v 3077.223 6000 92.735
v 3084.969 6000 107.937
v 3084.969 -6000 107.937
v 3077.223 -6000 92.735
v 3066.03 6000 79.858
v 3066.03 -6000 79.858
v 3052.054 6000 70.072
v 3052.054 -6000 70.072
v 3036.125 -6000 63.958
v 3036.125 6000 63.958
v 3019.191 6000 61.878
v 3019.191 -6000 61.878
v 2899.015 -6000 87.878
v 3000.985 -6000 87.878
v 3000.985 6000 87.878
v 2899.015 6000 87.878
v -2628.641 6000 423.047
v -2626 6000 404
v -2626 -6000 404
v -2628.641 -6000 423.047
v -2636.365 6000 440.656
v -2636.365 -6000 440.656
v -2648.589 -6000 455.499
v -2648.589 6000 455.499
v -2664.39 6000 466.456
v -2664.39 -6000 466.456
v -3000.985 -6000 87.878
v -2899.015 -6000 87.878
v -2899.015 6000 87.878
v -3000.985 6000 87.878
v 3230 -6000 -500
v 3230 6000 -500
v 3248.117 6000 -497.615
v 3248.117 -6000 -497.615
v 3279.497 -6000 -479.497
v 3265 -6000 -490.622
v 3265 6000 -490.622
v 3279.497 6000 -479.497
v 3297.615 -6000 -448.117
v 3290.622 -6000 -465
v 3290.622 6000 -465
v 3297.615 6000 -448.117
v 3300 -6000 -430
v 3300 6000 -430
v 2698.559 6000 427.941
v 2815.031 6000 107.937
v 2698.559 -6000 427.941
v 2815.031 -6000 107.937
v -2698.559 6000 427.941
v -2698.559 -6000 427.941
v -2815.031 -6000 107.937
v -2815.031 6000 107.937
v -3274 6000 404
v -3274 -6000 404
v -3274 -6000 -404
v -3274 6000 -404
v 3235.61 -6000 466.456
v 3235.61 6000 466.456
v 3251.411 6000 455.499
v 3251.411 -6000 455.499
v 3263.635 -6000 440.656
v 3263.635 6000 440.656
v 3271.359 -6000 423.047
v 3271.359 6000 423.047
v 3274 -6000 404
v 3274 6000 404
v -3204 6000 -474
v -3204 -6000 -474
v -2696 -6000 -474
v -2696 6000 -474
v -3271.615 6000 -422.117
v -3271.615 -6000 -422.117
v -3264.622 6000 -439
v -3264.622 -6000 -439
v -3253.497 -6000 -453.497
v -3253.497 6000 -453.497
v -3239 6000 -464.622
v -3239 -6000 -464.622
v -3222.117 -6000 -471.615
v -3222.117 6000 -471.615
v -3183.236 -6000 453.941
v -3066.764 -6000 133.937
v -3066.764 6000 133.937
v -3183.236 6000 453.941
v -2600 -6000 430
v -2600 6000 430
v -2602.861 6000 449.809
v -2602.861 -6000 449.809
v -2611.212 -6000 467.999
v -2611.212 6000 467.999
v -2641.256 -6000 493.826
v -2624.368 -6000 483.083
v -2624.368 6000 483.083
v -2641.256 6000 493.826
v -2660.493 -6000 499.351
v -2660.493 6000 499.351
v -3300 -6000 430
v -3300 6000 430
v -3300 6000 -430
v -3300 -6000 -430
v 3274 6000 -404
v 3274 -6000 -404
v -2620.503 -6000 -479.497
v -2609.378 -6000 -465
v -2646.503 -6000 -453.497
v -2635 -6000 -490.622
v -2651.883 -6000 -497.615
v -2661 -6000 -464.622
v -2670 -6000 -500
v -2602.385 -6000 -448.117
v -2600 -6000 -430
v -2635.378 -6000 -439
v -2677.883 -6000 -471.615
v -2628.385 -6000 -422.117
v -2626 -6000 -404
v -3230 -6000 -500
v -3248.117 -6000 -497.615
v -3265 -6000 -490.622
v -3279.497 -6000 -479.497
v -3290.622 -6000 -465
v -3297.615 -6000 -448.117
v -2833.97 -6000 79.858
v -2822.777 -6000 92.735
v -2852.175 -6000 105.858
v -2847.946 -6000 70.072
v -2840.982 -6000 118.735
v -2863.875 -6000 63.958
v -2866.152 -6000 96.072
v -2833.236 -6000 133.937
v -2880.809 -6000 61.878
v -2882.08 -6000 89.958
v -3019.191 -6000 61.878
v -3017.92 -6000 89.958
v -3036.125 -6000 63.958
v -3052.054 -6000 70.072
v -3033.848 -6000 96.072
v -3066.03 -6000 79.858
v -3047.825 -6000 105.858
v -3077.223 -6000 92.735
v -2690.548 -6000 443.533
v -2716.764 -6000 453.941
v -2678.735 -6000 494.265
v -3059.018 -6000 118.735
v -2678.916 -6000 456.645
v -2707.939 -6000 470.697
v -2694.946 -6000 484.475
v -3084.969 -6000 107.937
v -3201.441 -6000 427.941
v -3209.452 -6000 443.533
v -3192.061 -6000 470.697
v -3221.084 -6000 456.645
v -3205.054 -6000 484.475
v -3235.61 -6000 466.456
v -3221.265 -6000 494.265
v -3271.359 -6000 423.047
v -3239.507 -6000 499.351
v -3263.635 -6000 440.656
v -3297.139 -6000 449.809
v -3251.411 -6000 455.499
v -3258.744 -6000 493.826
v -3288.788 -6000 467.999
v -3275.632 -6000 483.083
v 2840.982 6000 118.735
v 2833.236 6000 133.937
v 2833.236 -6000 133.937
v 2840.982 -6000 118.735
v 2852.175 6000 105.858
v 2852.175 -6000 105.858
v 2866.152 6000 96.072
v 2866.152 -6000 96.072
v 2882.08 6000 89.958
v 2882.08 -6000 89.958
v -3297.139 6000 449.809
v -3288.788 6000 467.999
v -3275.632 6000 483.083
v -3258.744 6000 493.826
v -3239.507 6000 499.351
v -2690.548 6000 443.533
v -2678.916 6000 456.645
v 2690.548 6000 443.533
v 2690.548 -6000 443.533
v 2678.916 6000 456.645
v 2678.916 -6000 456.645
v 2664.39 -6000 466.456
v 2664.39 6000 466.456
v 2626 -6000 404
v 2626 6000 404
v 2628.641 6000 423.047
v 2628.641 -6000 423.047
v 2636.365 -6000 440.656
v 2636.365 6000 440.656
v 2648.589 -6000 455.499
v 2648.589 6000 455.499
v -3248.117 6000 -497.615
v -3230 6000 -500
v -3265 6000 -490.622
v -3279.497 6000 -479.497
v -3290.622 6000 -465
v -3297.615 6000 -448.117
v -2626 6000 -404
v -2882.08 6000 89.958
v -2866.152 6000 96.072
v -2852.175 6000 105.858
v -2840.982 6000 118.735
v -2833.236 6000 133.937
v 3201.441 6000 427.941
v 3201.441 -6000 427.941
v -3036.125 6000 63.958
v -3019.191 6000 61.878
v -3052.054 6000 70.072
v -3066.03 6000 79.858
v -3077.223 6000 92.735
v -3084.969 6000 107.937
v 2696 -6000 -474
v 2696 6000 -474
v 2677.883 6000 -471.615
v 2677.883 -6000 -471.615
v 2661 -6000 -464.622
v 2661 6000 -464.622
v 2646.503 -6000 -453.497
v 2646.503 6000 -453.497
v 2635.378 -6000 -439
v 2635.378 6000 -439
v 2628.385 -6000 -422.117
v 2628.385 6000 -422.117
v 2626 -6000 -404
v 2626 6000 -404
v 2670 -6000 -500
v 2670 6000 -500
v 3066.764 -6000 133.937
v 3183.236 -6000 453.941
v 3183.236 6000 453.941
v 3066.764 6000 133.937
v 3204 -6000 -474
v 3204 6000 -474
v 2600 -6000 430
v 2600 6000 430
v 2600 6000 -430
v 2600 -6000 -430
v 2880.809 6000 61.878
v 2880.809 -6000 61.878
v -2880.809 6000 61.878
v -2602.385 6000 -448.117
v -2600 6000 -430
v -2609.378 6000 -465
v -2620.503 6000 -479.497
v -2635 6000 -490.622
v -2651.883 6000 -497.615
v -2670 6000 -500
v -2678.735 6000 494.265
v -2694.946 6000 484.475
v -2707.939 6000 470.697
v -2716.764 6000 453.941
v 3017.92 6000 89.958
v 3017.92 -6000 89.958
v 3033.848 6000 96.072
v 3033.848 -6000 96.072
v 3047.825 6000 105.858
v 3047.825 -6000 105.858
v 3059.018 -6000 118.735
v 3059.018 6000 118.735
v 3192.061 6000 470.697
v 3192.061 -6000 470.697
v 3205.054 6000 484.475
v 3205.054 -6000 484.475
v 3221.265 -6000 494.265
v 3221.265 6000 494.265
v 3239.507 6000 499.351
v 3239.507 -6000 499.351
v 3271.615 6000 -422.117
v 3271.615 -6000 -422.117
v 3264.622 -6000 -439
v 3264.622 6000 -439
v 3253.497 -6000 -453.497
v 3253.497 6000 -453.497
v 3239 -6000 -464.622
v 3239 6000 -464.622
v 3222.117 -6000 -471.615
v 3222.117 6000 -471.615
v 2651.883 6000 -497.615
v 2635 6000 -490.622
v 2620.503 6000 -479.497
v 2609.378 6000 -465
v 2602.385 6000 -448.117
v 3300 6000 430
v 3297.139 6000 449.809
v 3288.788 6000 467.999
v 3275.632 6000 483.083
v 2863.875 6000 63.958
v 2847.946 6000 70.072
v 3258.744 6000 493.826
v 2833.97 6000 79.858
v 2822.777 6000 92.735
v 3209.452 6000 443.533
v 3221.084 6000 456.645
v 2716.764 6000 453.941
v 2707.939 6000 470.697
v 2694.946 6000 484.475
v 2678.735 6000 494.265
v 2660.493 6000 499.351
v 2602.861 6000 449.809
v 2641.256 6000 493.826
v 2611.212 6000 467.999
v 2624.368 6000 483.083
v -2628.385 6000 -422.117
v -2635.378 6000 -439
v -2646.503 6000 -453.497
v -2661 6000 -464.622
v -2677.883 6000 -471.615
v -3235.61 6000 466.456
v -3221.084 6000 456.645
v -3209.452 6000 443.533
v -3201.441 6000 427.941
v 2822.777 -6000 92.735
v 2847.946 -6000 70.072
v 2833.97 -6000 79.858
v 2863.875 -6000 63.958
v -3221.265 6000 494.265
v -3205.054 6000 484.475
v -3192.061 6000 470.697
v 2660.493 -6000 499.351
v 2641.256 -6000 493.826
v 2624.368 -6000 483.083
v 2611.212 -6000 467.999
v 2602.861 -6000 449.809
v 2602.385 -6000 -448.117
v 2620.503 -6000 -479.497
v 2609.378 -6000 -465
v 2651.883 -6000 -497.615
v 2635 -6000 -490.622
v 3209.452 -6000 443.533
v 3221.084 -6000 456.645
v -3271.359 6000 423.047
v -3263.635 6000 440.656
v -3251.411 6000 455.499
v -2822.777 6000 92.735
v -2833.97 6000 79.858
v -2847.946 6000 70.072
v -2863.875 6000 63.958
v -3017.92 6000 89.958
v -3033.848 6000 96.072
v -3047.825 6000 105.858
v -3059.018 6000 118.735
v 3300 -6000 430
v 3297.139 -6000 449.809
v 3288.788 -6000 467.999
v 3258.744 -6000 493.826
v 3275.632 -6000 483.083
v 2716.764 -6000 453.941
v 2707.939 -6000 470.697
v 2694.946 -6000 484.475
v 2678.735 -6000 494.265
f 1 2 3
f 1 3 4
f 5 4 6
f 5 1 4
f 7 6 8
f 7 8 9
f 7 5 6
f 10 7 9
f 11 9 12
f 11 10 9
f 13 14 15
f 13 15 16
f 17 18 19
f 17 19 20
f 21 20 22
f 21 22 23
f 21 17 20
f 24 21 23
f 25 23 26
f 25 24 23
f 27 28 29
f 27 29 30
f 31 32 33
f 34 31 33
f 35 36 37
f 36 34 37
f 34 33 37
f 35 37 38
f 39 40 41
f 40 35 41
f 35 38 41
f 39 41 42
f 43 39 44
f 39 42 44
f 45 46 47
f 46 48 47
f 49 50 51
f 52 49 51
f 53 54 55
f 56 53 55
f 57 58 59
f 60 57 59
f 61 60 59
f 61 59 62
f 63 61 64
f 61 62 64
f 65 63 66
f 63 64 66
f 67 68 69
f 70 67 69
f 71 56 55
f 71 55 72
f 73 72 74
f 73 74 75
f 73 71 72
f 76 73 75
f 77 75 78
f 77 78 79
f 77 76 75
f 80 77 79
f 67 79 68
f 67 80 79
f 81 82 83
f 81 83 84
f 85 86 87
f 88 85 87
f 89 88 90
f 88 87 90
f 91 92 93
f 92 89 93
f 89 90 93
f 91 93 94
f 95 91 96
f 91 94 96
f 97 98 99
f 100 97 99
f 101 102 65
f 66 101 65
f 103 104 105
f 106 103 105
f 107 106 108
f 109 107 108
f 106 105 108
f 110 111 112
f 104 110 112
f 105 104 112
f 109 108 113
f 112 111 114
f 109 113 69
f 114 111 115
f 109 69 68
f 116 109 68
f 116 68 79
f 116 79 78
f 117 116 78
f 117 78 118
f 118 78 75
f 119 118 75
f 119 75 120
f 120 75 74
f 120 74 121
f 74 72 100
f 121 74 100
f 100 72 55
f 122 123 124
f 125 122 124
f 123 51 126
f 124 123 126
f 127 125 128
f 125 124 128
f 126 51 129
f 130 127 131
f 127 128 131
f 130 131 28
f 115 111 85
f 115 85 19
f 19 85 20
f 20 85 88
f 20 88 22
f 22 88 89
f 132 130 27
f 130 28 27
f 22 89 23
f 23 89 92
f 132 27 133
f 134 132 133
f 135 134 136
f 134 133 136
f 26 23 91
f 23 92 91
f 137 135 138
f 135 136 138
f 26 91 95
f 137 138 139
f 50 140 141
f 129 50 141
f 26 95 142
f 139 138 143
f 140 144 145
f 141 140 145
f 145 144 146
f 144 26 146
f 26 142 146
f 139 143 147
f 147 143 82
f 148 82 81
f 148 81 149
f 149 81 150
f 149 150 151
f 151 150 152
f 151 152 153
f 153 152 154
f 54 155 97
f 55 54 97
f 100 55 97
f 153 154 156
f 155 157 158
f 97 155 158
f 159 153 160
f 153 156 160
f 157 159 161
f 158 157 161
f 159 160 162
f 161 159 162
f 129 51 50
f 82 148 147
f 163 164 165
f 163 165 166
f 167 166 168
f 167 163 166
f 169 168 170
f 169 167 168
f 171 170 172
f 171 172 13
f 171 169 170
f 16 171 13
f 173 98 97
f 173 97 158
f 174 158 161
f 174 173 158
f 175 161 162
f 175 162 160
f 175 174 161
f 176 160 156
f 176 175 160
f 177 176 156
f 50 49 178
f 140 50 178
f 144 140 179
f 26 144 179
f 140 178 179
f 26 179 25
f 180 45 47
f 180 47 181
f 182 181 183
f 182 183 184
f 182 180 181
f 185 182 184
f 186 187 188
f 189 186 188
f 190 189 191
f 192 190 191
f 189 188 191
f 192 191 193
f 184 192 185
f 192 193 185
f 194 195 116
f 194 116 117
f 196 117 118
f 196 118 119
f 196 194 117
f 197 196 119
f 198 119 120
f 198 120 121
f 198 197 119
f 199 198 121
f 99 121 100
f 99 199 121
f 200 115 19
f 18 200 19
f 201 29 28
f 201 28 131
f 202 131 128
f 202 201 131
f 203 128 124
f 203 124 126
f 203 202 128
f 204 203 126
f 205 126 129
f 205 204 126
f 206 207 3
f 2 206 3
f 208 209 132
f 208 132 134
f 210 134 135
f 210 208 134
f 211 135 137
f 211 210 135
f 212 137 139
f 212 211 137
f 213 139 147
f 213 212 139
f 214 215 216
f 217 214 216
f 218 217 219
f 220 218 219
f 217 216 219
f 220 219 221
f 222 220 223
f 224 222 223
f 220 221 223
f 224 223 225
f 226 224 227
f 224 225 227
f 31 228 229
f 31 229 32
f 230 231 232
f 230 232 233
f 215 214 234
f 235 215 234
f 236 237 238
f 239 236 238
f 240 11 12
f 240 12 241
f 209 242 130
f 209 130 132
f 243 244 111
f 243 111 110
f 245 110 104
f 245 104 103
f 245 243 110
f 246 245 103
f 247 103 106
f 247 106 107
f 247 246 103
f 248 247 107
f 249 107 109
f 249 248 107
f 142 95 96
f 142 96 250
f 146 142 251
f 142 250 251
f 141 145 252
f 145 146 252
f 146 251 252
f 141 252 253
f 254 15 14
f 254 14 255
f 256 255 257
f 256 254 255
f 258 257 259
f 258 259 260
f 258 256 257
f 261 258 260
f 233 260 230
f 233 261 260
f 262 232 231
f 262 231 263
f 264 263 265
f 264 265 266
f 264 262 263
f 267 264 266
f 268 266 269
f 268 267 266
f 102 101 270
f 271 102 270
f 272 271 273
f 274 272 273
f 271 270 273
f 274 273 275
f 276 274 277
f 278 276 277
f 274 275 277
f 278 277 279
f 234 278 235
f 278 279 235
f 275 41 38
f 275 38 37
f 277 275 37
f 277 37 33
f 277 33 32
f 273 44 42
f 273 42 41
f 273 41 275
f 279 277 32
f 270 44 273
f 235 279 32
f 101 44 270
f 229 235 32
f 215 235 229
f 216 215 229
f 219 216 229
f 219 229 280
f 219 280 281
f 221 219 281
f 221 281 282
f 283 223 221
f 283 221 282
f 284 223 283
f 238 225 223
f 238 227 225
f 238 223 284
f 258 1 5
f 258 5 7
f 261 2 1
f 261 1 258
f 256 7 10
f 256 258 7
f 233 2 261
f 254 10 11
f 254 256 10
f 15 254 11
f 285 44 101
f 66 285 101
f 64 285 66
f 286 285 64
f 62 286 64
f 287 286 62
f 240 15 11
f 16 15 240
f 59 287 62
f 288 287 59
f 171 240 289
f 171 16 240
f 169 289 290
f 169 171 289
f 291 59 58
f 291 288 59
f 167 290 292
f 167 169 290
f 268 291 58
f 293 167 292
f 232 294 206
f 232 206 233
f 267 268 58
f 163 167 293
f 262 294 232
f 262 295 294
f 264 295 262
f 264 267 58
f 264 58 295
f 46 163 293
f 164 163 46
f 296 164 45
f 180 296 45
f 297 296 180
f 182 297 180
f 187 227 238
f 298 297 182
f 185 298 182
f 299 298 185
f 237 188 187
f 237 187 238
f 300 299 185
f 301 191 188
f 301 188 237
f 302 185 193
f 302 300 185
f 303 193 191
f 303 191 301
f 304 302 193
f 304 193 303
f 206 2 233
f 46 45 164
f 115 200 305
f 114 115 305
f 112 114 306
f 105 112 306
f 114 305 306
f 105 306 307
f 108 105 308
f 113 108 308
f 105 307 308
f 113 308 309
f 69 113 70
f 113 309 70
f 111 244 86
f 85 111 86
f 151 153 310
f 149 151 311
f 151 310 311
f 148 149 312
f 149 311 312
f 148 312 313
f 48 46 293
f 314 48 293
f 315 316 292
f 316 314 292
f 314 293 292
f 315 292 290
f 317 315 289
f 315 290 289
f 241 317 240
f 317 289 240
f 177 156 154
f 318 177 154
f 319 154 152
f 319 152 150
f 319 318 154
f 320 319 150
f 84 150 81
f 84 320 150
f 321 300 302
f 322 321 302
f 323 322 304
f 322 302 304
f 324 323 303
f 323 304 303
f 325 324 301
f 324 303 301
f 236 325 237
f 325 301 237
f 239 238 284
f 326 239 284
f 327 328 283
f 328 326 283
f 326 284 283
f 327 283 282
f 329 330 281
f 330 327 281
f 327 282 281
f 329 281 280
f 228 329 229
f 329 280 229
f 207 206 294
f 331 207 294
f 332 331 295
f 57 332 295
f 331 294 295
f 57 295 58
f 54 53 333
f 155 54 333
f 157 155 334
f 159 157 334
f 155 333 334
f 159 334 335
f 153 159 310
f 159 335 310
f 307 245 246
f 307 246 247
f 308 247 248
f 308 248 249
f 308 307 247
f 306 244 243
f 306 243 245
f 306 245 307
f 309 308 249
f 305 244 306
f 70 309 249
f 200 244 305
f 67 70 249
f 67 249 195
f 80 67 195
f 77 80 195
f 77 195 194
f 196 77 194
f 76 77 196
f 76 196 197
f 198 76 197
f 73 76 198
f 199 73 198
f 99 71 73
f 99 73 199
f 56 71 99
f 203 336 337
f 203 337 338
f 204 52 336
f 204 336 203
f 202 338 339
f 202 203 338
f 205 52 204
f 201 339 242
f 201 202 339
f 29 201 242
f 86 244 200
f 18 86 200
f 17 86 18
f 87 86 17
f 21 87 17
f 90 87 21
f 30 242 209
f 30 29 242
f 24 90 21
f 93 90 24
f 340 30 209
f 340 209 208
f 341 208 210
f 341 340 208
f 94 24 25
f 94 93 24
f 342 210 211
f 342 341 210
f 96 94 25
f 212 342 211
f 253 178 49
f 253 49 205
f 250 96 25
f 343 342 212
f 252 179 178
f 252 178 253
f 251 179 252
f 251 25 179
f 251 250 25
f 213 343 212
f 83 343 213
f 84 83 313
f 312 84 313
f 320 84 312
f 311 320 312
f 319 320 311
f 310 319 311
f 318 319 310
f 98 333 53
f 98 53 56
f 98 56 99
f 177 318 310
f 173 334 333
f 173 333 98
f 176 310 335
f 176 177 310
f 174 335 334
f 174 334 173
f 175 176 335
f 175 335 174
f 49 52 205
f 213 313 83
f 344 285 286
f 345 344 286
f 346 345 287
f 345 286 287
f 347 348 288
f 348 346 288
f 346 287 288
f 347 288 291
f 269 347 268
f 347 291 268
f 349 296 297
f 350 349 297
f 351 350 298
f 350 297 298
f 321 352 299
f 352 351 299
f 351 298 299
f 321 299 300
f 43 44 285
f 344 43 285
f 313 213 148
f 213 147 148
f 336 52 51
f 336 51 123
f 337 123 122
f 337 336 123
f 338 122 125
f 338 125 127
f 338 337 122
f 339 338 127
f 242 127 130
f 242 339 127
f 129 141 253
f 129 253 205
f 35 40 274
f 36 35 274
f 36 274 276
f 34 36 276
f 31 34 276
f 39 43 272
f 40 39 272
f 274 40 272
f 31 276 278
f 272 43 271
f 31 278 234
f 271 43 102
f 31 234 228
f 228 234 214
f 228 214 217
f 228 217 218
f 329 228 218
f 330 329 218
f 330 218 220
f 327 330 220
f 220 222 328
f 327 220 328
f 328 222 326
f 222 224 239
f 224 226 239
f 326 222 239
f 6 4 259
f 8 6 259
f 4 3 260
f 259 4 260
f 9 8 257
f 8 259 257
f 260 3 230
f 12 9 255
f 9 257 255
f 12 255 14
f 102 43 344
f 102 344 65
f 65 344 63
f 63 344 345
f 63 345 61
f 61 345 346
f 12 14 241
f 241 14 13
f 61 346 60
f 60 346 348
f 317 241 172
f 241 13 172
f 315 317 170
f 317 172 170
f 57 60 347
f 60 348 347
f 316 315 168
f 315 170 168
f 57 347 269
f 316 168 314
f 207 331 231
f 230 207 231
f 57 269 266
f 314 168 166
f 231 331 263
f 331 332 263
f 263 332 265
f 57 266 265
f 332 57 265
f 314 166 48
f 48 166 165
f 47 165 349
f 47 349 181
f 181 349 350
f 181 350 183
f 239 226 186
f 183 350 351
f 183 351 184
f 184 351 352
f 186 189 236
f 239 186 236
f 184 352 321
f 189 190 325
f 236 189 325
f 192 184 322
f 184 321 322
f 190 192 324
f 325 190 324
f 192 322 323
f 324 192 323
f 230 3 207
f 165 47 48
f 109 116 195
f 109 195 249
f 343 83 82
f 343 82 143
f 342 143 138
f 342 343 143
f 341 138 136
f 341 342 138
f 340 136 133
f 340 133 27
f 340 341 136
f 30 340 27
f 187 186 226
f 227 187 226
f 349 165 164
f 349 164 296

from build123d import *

# Parameters (mm, degrees)
F1_DEPTH    = 6000
F2_T        = -26
F2_2_T      = -26
F3_T1_DEPTH = 12000
F3_T3_DEPTH = 12350
F3_T5_DEPTH = 12245.0726383734
F4_T1_DEPTH = 12000
F4_T3_DEPTH = 12350
F4_T5_DEPTH = 12245.0726383734


# Not quite as in the source:
# - a fillet or chamfer that OpenCascade refuses, or shapes differently, is made with other operations: its cross-section is extruded or revolved along the edge and cut away or added
# - a feature names something its author has since deleted; it is built from what else it names


with BuildPart() as f1:
    # F0 (on Front) → F1 (new body, symmetric)
    with BuildSketch(Plane.XZ):
        Polygon((2700, 500), (2600, 500), (2600, 200), (2600, 0), (2600, -200), (2600, -500), (3300, -500), (3300, 500), (3200, 500), (3050, 87.8783870818), (2850, 87.8783870818), align=None)
    extrude(amount=F1_DEPTH, both=True)

    # F2
    f2_openings = [f1.faces().sort_by_distance(p)[0] for p in [
        (2950, -6000, -83.929869),
        (2950, 6000, -83.929869),
    ]]
    offset(amount=F2_T, openings=f2_openings, kind=Kind.INTERSECTION)

    # F3: fillet of radius 70 on 16 edges, made by hand

    # F3_s2 → F3_t1 (join)
    with BuildSketch(Plane.XZ.offset(-6000)):
        with BuildLine():
            ThreePointArc((2833.2360442197, 133.936977049), (2858.8641771301, 100.5377439816), (2899.0145276747, 87.8783870818))
            Line((2899.0145276747, 87.8783870818), (2850, 87.8783870818))
            Line((2850, 87.8783870818), (2833.2360442197, 133.936977049))
        make_face()
        with BuildLine():
            ThreePointArc((2696, -474), (2646.5025253169, -453.4974746831), (2626, -404))
            Line((2626, -404), (2626, -474))
            Line((2626, -474), (2696, -474))
        make_face()
        with BuildLine():
            ThreePointArc((3201.4414402131, 427.9414100328), (3227.0695731236, 461.3406431002), (3267.2199236681, 474))
            Line((3267.2199236681, 474), (3218.2053959935, 474))
            Line((3218.2053959935, 474), (3201.4414402131, 427.9414100328))
        make_face()
        with BuildLine():
            ThreePointArc((3204, 474), (3253.4974746831, 453.4974746831), (3274, 404))
            Line((3274, 404), (3274, 474))
            Line((3274, 474), (3204, 474))
        make_face()
        with BuildLine():
            ThreePointArc((2698.5585597869, 427.9414100328), (2672.9304268764, 461.3406431002), (2632.7800763319, 474))
            Line((2632.7800763319, 474), (2681.7946040065, 474))
            Line((2681.7946040065, 474), (2698.5585597869, 427.9414100328))
        make_face()
        with BuildLine():
            ThreePointArc((2626, 404), (2646.5025253169, 453.4974746831), (2696, 474))
            Line((2696, 474), (2626, 474))
            Line((2626, 474), (2626, 404))
        make_face()
        with BuildLine():
            ThreePointArc((3274, -404), (3253.4974746831, -453.4974746831), (3204, -474))
            Line((3204, -474), (3274, -474))
            Line((3274, -474), (3274, -404))
        make_face()
        with BuildLine():
            ThreePointArc((3000.9854723253, 87.8783870818), (3041.1358228699, 100.5377439816), (3066.7639557803, 133.936977049))
            Line((3066.7639557803, 133.936977049), (3050, 87.8783870818))
            Line((3050, 87.8783870818), (3000.9854723253, 87.8783870818))
        make_face()
    extrude(amount=F3_T1_DEPTH)

    # F3_s4 → F3_t3 (cut)
    with BuildSketch(Plane.XZ.offset(-6175)):
        with BuildLine():
            ThreePointArc((3300, 430), (3279.4974746831, 479.4974746831), (3230, 500))
            Line((3230, 500), (3300, 500))
            Line((3300, 500), (3300, 430))
        make_face()
        with BuildLine():
            ThreePointArc((2670, 500), (2620.5025253169, 479.4974746831), (2600, 430))
            Line((2600, 430), (2600, 500))
            Line((2600, 500), (2670, 500))
        make_face()
        with BuildLine():
            ThreePointArc((3230, -500), (3279.4974746831, -479.4974746831), (3300, -430))
            Line((3300, -430), (3300, -500))
            Line((3300, -500), (3230, -500))
        make_face()
        with BuildLine():
            ThreePointArc((2600, -430), (2620.5025253169, -479.4974746831), (2670, -500))
            Line((2670, -500), (2600, -500))
            Line((2600, -500), (2600, -430))
        make_face()
    extrude(amount=F3_T3_DEPTH, mode=Mode.SUBTRACT)

    # F3_s6 → F3_t5 (cut)
    with BuildSketch(Plane.XZ.offset(-6122.5363191867)):
        with BuildLine():
            ThreePointArc((2716.7639557803, 453.9414100328), (2691.1358228699, 487.3406431002), (2650.9854723253, 500))
            Line((2650.9854723253, 500), (2700, 500))
            Line((2700, 500), (2716.7639557803, 453.9414100328))
        make_face()
        with BuildLine():
            ThreePointArc((3183.2360442197, 453.9414100328), (3208.8641771301, 487.3406431002), (3249.0145276747, 500))
            Line((3249.0145276747, 500), (3200, 500))
            Line((3200, 500), (3183.2360442197, 453.9414100328))
        make_face()
        with BuildLine():
            ThreePointArc((3084.9693517738, 107.936977049), (3059.3412188633, 74.5377439816), (3019.1908683188, 61.8783870818))
            Line((3019.1908683188, 61.8783870818), (3068.2053959935, 61.8783870818))
            Line((3068.2053959935, 61.8783870818), (3084.9693517738, 107.936977049))
        make_face()
        with BuildLine():
            ThreePointArc((2815.0306482262, 107.936977049), (2840.6587811367, 74.5377439816), (2880.8091316812, 61.8783870818))
            Line((2880.8091316812, 61.8783870818), (2831.7946040065, 61.8783870818))
            Line((2831.7946040065, 61.8783870818), (2815.0306482262, 107.936977049))
        make_face()
    extrude(amount=F3_T5_DEPTH, mode=Mode.SUBTRACT)


with BuildPart() as f1b:
    # F0 (on Front) → F1, piece 2 (new body, symmetric)
    with BuildSketch(Plane.XZ):
        Polygon((-2600, -200), (-2600, 0), (-2600, 200), (-2600, 500), (-2700, 500), (-2850, 87.8783870818), (-3050, 87.8783870818), (-3200, 500), (-3300, 500), (-3300, -500), (-2600, -500), align=None)
    extrude(amount=F1_DEPTH, both=True)

    # F2#2
    f2_2_openings = [f1b.faces().sort_by_distance(p)[0] for p in [
        (-2950, -6000, -83.929869),
        (-2950, 6000, -83.929869),
    ]]
    offset(amount=F2_2_T, openings=f2_2_openings, kind=Kind.INTERSECTION)

    # F4: fillet of radius 70 on 16 edges, made by hand

    # F4_s2 → F4_t1 (join)
    with BuildSketch(Plane.XZ.offset(-6000)):
        with BuildLine():
            ThreePointArc((-3066.7639557803, 133.936977049), (-3041.1358228699, 100.5377439816), (-3000.9854723253, 87.8783870818))
            Line((-3000.9854723253, 87.8783870818), (-3050, 87.8783870818))
            Line((-3050, 87.8783870818), (-3066.7639557803, 133.936977049))
        make_face()
        with BuildLine():
            ThreePointArc((-3274, -404), (-3253.4974746831, -453.4974746831), (-3204, -474))
            Line((-3204, -474), (-3274, -474))
            Line((-3274, -474), (-3274, -404))
        make_face()
        with BuildLine():
            ThreePointArc((-2626, -404), (-2646.5025253169, -453.4974746831), (-2696, -474))
            Line((-2696, -474), (-2626, -474))
            Line((-2626, -474), (-2626, -404))
        make_face()
        with BuildLine():
            ThreePointArc((-2899.0145276747, 87.8783870818), (-2858.8641771301, 100.5377439816), (-2833.2360442197, 133.936977049))
            Line((-2833.2360442197, 133.936977049), (-2850, 87.8783870818))
            Line((-2850, 87.8783870818), (-2899.0145276747, 87.8783870818))
        make_face()
        with BuildLine():
            ThreePointArc((-3267.2199236681, 474), (-3227.0695731236, 461.3406431002), (-3201.4414402131, 427.9414100328))
            Line((-3201.4414402131, 427.9414100328), (-3218.2053959935, 474))
            Line((-3218.2053959935, 474), (-3267.2199236681, 474))
        make_face()
        with BuildLine():
            ThreePointArc((-2698.5585597869, 427.9414100328), (-2672.9304268764, 461.3406431002), (-2632.7800763319, 474))
            Line((-2632.7800763319, 474), (-2681.7946040065, 474))
            Line((-2681.7946040065, 474), (-2698.5585597869, 427.9414100328))
        make_face()
        with BuildLine():
            ThreePointArc((-2626, 404), (-2646.5025253169, 453.4974746831), (-2696, 474))
            Line((-2696, 474), (-2626, 474))
            Line((-2626, 474), (-2626, 404))
        make_face()
        with BuildLine():
            ThreePointArc((-3274, 404), (-3253.4974746831, 453.4974746831), (-3204, 474))
            Line((-3204, 474), (-3274, 474))
            Line((-3274, 474), (-3274, 404))
        make_face()
    extrude(amount=F4_T1_DEPTH)

    # F4_s4 → F4_t3 (cut)
    with BuildSketch(Plane.XZ.offset(-6175)):
        with BuildLine():
            ThreePointArc((-2600, 430), (-2620.5025253169, 479.4974746831), (-2670, 500))
            Line((-2670, 500), (-2600, 500))
            Line((-2600, 500), (-2600, 430))
        make_face()
        with BuildLine():
            ThreePointArc((-3300, 430), (-3279.4974746831, 479.4974746831), (-3230, 500))
            Line((-3230, 500), (-3300, 500))
            Line((-3300, 500), (-3300, 430))
        make_face()
        with BuildLine():
            ThreePointArc((-2600, -430), (-2620.5025253169, -479.4974746831), (-2670, -500))
            Line((-2670, -500), (-2600, -500))
            Line((-2600, -500), (-2600, -430))
        make_face()
        with BuildLine():
            ThreePointArc((-3230, -500), (-3279.4974746831, -479.4974746831), (-3300, -430))
            Line((-3300, -430), (-3300, -500))
            Line((-3300, -500), (-3230, -500))
        make_face()
    extrude(amount=F4_T3_DEPTH, mode=Mode.SUBTRACT)

    # F4_s6 → F4_t5 (cut)
    with BuildSketch(Plane.XZ.offset(-6122.5363191867)):
        with BuildLine():
            ThreePointArc((-2650.9854723253, 500), (-2691.1358228699, 487.3406431002), (-2716.7639557803, 453.9414100328))
            Line((-2716.7639557803, 453.9414100328), (-2700, 500))
            Line((-2700, 500), (-2650.9854723253, 500))
        make_face()
        with BuildLine():
            ThreePointArc((-3249.0145276747, 500), (-3208.8641771301, 487.3406431002), (-3183.2360442197, 453.9414100328))
            Line((-3183.2360442197, 453.9414100328), (-3200, 500))
            Line((-3200, 500), (-3249.0145276747, 500))
        make_face()
        with BuildLine():
            ThreePointArc((-2815.0306482262, 107.936977049), (-2840.6587811367, 74.5377439816), (-2880.8091316812, 61.8783870818))
            Line((-2880.8091316812, 61.8783870818), (-2831.7946040065, 61.8783870818))
            Line((-2831.7946040065, 61.8783870818), (-2815.0306482262, 107.936977049))
        make_face()
        with BuildLine():
            ThreePointArc((-3019.1908683188, 61.8783870818), (-3059.3412188633, 74.5377439816), (-3084.9693517738, 107.936977049))
            Line((-3084.9693517738, 107.936977049), (-3068.2053959935, 61.8783870818))
            Line((-3068.2053959935, 61.8783870818), (-3019.1908683188, 61.8783870818))
        make_face()
    extrude(amount=F4_T5_DEPTH, mode=Mode.SUBTRACT)


solid = Compound([f1.part, f1b.part])
